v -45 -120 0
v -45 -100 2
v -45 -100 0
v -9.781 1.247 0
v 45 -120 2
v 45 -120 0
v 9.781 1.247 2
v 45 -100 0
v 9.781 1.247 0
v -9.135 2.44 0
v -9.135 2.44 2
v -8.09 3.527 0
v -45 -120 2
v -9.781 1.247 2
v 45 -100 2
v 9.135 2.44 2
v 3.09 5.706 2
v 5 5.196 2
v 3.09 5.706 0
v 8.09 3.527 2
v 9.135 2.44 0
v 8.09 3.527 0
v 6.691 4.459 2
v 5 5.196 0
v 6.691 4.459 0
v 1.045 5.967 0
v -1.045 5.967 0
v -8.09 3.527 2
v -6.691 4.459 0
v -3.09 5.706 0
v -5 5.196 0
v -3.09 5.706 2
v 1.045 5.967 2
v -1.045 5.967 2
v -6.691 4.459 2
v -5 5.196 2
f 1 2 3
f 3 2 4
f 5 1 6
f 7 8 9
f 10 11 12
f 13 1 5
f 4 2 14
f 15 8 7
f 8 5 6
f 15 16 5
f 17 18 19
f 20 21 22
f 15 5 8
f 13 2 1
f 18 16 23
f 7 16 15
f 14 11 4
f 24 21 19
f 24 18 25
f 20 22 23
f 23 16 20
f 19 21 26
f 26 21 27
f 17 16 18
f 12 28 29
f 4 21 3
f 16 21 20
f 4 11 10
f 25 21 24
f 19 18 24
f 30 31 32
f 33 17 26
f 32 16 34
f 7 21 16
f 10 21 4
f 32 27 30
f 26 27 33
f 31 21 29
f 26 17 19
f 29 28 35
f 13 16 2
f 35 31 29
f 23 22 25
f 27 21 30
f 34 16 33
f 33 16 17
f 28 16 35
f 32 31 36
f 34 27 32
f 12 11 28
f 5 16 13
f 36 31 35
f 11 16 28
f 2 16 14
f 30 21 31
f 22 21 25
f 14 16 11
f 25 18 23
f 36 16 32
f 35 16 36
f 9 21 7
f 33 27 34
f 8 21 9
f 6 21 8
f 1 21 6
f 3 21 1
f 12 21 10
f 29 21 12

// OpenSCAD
// thing 1007491's key tag: an elliptic eye (a cylinder squashed by scale) hulled with a straight
// tag. The eye's faces are B-splines; hull() undoes the squash, hulls exactly, and stretches back.
hull() {
  scale([1, 0.6, 1]) cylinder(r = 10, h = 2);
  translate([-45, -120, 0]) cube([90, 20, 2]);
}
